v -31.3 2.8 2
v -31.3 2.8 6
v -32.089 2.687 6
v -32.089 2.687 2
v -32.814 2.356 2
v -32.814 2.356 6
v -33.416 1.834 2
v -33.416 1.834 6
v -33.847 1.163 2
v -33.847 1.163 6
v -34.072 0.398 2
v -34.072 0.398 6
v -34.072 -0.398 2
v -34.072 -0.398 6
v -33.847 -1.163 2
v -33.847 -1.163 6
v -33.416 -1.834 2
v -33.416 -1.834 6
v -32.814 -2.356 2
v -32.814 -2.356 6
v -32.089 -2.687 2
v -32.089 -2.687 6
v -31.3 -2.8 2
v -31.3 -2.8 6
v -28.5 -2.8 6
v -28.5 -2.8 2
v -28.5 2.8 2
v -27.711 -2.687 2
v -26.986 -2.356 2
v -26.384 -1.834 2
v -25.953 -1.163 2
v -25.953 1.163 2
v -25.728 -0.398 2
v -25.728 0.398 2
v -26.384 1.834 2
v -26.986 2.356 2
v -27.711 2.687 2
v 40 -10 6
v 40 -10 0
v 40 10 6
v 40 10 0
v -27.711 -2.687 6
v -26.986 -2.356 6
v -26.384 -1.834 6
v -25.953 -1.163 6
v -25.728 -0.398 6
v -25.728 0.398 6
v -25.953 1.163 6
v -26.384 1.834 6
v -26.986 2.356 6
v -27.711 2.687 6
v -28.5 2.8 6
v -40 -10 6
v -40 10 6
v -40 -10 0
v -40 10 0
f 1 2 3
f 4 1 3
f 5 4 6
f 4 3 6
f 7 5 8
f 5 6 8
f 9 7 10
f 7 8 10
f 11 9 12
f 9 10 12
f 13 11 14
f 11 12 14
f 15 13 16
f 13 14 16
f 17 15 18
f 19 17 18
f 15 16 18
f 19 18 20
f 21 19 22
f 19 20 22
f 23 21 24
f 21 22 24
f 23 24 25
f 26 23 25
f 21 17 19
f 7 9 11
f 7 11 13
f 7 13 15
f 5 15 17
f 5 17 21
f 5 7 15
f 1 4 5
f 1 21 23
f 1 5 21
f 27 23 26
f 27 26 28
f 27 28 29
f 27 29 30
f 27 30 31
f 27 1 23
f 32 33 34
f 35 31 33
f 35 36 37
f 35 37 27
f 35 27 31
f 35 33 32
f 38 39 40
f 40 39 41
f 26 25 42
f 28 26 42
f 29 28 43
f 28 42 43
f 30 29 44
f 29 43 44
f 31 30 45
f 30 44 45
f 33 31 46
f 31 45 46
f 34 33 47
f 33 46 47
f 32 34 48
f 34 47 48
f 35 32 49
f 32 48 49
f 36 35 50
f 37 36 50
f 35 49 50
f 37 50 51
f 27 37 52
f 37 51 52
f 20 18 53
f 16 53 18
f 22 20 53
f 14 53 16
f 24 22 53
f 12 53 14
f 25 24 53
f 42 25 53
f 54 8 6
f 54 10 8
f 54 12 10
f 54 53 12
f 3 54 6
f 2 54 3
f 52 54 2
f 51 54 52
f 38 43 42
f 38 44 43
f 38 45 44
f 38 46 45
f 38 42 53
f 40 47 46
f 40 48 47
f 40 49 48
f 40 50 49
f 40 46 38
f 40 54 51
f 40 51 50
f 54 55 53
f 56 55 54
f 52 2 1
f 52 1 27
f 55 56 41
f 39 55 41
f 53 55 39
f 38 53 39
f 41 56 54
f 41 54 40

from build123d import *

# Parameters (mm, degrees)
SKETCH_W     = 80
SKETCH_H     = 20
PAD_DEPTH    = 6
POCKET_DEPTH = 4


with BuildPart() as part:
    # Sketch → Pad (new body)
    with BuildSketch(Plane.XY):
        Rectangle(SKETCH_W, SKETCH_H)
    extrude(amount=PAD_DEPTH)

    # Sketch001 → Pocket (cut)
    with BuildSketch(Plane.XY.offset(6)):
        with BuildLine():
            ThreePointArc((-31.3, 2.8), (-34.1, 0), (-31.3, -2.8))
            Line((-31.3, -2.8), (-28.5, -2.8))
            ThreePointArc((-28.5, -2.8), (-25.7, 0), (-28.5, 2.8))
            Line((-31.3, 2.8), (-28.5, 2.8))
        make_face()
    extrude(amount=-POCKET_DEPTH, mode=Mode.SUBTRACT)


solid = part.part
